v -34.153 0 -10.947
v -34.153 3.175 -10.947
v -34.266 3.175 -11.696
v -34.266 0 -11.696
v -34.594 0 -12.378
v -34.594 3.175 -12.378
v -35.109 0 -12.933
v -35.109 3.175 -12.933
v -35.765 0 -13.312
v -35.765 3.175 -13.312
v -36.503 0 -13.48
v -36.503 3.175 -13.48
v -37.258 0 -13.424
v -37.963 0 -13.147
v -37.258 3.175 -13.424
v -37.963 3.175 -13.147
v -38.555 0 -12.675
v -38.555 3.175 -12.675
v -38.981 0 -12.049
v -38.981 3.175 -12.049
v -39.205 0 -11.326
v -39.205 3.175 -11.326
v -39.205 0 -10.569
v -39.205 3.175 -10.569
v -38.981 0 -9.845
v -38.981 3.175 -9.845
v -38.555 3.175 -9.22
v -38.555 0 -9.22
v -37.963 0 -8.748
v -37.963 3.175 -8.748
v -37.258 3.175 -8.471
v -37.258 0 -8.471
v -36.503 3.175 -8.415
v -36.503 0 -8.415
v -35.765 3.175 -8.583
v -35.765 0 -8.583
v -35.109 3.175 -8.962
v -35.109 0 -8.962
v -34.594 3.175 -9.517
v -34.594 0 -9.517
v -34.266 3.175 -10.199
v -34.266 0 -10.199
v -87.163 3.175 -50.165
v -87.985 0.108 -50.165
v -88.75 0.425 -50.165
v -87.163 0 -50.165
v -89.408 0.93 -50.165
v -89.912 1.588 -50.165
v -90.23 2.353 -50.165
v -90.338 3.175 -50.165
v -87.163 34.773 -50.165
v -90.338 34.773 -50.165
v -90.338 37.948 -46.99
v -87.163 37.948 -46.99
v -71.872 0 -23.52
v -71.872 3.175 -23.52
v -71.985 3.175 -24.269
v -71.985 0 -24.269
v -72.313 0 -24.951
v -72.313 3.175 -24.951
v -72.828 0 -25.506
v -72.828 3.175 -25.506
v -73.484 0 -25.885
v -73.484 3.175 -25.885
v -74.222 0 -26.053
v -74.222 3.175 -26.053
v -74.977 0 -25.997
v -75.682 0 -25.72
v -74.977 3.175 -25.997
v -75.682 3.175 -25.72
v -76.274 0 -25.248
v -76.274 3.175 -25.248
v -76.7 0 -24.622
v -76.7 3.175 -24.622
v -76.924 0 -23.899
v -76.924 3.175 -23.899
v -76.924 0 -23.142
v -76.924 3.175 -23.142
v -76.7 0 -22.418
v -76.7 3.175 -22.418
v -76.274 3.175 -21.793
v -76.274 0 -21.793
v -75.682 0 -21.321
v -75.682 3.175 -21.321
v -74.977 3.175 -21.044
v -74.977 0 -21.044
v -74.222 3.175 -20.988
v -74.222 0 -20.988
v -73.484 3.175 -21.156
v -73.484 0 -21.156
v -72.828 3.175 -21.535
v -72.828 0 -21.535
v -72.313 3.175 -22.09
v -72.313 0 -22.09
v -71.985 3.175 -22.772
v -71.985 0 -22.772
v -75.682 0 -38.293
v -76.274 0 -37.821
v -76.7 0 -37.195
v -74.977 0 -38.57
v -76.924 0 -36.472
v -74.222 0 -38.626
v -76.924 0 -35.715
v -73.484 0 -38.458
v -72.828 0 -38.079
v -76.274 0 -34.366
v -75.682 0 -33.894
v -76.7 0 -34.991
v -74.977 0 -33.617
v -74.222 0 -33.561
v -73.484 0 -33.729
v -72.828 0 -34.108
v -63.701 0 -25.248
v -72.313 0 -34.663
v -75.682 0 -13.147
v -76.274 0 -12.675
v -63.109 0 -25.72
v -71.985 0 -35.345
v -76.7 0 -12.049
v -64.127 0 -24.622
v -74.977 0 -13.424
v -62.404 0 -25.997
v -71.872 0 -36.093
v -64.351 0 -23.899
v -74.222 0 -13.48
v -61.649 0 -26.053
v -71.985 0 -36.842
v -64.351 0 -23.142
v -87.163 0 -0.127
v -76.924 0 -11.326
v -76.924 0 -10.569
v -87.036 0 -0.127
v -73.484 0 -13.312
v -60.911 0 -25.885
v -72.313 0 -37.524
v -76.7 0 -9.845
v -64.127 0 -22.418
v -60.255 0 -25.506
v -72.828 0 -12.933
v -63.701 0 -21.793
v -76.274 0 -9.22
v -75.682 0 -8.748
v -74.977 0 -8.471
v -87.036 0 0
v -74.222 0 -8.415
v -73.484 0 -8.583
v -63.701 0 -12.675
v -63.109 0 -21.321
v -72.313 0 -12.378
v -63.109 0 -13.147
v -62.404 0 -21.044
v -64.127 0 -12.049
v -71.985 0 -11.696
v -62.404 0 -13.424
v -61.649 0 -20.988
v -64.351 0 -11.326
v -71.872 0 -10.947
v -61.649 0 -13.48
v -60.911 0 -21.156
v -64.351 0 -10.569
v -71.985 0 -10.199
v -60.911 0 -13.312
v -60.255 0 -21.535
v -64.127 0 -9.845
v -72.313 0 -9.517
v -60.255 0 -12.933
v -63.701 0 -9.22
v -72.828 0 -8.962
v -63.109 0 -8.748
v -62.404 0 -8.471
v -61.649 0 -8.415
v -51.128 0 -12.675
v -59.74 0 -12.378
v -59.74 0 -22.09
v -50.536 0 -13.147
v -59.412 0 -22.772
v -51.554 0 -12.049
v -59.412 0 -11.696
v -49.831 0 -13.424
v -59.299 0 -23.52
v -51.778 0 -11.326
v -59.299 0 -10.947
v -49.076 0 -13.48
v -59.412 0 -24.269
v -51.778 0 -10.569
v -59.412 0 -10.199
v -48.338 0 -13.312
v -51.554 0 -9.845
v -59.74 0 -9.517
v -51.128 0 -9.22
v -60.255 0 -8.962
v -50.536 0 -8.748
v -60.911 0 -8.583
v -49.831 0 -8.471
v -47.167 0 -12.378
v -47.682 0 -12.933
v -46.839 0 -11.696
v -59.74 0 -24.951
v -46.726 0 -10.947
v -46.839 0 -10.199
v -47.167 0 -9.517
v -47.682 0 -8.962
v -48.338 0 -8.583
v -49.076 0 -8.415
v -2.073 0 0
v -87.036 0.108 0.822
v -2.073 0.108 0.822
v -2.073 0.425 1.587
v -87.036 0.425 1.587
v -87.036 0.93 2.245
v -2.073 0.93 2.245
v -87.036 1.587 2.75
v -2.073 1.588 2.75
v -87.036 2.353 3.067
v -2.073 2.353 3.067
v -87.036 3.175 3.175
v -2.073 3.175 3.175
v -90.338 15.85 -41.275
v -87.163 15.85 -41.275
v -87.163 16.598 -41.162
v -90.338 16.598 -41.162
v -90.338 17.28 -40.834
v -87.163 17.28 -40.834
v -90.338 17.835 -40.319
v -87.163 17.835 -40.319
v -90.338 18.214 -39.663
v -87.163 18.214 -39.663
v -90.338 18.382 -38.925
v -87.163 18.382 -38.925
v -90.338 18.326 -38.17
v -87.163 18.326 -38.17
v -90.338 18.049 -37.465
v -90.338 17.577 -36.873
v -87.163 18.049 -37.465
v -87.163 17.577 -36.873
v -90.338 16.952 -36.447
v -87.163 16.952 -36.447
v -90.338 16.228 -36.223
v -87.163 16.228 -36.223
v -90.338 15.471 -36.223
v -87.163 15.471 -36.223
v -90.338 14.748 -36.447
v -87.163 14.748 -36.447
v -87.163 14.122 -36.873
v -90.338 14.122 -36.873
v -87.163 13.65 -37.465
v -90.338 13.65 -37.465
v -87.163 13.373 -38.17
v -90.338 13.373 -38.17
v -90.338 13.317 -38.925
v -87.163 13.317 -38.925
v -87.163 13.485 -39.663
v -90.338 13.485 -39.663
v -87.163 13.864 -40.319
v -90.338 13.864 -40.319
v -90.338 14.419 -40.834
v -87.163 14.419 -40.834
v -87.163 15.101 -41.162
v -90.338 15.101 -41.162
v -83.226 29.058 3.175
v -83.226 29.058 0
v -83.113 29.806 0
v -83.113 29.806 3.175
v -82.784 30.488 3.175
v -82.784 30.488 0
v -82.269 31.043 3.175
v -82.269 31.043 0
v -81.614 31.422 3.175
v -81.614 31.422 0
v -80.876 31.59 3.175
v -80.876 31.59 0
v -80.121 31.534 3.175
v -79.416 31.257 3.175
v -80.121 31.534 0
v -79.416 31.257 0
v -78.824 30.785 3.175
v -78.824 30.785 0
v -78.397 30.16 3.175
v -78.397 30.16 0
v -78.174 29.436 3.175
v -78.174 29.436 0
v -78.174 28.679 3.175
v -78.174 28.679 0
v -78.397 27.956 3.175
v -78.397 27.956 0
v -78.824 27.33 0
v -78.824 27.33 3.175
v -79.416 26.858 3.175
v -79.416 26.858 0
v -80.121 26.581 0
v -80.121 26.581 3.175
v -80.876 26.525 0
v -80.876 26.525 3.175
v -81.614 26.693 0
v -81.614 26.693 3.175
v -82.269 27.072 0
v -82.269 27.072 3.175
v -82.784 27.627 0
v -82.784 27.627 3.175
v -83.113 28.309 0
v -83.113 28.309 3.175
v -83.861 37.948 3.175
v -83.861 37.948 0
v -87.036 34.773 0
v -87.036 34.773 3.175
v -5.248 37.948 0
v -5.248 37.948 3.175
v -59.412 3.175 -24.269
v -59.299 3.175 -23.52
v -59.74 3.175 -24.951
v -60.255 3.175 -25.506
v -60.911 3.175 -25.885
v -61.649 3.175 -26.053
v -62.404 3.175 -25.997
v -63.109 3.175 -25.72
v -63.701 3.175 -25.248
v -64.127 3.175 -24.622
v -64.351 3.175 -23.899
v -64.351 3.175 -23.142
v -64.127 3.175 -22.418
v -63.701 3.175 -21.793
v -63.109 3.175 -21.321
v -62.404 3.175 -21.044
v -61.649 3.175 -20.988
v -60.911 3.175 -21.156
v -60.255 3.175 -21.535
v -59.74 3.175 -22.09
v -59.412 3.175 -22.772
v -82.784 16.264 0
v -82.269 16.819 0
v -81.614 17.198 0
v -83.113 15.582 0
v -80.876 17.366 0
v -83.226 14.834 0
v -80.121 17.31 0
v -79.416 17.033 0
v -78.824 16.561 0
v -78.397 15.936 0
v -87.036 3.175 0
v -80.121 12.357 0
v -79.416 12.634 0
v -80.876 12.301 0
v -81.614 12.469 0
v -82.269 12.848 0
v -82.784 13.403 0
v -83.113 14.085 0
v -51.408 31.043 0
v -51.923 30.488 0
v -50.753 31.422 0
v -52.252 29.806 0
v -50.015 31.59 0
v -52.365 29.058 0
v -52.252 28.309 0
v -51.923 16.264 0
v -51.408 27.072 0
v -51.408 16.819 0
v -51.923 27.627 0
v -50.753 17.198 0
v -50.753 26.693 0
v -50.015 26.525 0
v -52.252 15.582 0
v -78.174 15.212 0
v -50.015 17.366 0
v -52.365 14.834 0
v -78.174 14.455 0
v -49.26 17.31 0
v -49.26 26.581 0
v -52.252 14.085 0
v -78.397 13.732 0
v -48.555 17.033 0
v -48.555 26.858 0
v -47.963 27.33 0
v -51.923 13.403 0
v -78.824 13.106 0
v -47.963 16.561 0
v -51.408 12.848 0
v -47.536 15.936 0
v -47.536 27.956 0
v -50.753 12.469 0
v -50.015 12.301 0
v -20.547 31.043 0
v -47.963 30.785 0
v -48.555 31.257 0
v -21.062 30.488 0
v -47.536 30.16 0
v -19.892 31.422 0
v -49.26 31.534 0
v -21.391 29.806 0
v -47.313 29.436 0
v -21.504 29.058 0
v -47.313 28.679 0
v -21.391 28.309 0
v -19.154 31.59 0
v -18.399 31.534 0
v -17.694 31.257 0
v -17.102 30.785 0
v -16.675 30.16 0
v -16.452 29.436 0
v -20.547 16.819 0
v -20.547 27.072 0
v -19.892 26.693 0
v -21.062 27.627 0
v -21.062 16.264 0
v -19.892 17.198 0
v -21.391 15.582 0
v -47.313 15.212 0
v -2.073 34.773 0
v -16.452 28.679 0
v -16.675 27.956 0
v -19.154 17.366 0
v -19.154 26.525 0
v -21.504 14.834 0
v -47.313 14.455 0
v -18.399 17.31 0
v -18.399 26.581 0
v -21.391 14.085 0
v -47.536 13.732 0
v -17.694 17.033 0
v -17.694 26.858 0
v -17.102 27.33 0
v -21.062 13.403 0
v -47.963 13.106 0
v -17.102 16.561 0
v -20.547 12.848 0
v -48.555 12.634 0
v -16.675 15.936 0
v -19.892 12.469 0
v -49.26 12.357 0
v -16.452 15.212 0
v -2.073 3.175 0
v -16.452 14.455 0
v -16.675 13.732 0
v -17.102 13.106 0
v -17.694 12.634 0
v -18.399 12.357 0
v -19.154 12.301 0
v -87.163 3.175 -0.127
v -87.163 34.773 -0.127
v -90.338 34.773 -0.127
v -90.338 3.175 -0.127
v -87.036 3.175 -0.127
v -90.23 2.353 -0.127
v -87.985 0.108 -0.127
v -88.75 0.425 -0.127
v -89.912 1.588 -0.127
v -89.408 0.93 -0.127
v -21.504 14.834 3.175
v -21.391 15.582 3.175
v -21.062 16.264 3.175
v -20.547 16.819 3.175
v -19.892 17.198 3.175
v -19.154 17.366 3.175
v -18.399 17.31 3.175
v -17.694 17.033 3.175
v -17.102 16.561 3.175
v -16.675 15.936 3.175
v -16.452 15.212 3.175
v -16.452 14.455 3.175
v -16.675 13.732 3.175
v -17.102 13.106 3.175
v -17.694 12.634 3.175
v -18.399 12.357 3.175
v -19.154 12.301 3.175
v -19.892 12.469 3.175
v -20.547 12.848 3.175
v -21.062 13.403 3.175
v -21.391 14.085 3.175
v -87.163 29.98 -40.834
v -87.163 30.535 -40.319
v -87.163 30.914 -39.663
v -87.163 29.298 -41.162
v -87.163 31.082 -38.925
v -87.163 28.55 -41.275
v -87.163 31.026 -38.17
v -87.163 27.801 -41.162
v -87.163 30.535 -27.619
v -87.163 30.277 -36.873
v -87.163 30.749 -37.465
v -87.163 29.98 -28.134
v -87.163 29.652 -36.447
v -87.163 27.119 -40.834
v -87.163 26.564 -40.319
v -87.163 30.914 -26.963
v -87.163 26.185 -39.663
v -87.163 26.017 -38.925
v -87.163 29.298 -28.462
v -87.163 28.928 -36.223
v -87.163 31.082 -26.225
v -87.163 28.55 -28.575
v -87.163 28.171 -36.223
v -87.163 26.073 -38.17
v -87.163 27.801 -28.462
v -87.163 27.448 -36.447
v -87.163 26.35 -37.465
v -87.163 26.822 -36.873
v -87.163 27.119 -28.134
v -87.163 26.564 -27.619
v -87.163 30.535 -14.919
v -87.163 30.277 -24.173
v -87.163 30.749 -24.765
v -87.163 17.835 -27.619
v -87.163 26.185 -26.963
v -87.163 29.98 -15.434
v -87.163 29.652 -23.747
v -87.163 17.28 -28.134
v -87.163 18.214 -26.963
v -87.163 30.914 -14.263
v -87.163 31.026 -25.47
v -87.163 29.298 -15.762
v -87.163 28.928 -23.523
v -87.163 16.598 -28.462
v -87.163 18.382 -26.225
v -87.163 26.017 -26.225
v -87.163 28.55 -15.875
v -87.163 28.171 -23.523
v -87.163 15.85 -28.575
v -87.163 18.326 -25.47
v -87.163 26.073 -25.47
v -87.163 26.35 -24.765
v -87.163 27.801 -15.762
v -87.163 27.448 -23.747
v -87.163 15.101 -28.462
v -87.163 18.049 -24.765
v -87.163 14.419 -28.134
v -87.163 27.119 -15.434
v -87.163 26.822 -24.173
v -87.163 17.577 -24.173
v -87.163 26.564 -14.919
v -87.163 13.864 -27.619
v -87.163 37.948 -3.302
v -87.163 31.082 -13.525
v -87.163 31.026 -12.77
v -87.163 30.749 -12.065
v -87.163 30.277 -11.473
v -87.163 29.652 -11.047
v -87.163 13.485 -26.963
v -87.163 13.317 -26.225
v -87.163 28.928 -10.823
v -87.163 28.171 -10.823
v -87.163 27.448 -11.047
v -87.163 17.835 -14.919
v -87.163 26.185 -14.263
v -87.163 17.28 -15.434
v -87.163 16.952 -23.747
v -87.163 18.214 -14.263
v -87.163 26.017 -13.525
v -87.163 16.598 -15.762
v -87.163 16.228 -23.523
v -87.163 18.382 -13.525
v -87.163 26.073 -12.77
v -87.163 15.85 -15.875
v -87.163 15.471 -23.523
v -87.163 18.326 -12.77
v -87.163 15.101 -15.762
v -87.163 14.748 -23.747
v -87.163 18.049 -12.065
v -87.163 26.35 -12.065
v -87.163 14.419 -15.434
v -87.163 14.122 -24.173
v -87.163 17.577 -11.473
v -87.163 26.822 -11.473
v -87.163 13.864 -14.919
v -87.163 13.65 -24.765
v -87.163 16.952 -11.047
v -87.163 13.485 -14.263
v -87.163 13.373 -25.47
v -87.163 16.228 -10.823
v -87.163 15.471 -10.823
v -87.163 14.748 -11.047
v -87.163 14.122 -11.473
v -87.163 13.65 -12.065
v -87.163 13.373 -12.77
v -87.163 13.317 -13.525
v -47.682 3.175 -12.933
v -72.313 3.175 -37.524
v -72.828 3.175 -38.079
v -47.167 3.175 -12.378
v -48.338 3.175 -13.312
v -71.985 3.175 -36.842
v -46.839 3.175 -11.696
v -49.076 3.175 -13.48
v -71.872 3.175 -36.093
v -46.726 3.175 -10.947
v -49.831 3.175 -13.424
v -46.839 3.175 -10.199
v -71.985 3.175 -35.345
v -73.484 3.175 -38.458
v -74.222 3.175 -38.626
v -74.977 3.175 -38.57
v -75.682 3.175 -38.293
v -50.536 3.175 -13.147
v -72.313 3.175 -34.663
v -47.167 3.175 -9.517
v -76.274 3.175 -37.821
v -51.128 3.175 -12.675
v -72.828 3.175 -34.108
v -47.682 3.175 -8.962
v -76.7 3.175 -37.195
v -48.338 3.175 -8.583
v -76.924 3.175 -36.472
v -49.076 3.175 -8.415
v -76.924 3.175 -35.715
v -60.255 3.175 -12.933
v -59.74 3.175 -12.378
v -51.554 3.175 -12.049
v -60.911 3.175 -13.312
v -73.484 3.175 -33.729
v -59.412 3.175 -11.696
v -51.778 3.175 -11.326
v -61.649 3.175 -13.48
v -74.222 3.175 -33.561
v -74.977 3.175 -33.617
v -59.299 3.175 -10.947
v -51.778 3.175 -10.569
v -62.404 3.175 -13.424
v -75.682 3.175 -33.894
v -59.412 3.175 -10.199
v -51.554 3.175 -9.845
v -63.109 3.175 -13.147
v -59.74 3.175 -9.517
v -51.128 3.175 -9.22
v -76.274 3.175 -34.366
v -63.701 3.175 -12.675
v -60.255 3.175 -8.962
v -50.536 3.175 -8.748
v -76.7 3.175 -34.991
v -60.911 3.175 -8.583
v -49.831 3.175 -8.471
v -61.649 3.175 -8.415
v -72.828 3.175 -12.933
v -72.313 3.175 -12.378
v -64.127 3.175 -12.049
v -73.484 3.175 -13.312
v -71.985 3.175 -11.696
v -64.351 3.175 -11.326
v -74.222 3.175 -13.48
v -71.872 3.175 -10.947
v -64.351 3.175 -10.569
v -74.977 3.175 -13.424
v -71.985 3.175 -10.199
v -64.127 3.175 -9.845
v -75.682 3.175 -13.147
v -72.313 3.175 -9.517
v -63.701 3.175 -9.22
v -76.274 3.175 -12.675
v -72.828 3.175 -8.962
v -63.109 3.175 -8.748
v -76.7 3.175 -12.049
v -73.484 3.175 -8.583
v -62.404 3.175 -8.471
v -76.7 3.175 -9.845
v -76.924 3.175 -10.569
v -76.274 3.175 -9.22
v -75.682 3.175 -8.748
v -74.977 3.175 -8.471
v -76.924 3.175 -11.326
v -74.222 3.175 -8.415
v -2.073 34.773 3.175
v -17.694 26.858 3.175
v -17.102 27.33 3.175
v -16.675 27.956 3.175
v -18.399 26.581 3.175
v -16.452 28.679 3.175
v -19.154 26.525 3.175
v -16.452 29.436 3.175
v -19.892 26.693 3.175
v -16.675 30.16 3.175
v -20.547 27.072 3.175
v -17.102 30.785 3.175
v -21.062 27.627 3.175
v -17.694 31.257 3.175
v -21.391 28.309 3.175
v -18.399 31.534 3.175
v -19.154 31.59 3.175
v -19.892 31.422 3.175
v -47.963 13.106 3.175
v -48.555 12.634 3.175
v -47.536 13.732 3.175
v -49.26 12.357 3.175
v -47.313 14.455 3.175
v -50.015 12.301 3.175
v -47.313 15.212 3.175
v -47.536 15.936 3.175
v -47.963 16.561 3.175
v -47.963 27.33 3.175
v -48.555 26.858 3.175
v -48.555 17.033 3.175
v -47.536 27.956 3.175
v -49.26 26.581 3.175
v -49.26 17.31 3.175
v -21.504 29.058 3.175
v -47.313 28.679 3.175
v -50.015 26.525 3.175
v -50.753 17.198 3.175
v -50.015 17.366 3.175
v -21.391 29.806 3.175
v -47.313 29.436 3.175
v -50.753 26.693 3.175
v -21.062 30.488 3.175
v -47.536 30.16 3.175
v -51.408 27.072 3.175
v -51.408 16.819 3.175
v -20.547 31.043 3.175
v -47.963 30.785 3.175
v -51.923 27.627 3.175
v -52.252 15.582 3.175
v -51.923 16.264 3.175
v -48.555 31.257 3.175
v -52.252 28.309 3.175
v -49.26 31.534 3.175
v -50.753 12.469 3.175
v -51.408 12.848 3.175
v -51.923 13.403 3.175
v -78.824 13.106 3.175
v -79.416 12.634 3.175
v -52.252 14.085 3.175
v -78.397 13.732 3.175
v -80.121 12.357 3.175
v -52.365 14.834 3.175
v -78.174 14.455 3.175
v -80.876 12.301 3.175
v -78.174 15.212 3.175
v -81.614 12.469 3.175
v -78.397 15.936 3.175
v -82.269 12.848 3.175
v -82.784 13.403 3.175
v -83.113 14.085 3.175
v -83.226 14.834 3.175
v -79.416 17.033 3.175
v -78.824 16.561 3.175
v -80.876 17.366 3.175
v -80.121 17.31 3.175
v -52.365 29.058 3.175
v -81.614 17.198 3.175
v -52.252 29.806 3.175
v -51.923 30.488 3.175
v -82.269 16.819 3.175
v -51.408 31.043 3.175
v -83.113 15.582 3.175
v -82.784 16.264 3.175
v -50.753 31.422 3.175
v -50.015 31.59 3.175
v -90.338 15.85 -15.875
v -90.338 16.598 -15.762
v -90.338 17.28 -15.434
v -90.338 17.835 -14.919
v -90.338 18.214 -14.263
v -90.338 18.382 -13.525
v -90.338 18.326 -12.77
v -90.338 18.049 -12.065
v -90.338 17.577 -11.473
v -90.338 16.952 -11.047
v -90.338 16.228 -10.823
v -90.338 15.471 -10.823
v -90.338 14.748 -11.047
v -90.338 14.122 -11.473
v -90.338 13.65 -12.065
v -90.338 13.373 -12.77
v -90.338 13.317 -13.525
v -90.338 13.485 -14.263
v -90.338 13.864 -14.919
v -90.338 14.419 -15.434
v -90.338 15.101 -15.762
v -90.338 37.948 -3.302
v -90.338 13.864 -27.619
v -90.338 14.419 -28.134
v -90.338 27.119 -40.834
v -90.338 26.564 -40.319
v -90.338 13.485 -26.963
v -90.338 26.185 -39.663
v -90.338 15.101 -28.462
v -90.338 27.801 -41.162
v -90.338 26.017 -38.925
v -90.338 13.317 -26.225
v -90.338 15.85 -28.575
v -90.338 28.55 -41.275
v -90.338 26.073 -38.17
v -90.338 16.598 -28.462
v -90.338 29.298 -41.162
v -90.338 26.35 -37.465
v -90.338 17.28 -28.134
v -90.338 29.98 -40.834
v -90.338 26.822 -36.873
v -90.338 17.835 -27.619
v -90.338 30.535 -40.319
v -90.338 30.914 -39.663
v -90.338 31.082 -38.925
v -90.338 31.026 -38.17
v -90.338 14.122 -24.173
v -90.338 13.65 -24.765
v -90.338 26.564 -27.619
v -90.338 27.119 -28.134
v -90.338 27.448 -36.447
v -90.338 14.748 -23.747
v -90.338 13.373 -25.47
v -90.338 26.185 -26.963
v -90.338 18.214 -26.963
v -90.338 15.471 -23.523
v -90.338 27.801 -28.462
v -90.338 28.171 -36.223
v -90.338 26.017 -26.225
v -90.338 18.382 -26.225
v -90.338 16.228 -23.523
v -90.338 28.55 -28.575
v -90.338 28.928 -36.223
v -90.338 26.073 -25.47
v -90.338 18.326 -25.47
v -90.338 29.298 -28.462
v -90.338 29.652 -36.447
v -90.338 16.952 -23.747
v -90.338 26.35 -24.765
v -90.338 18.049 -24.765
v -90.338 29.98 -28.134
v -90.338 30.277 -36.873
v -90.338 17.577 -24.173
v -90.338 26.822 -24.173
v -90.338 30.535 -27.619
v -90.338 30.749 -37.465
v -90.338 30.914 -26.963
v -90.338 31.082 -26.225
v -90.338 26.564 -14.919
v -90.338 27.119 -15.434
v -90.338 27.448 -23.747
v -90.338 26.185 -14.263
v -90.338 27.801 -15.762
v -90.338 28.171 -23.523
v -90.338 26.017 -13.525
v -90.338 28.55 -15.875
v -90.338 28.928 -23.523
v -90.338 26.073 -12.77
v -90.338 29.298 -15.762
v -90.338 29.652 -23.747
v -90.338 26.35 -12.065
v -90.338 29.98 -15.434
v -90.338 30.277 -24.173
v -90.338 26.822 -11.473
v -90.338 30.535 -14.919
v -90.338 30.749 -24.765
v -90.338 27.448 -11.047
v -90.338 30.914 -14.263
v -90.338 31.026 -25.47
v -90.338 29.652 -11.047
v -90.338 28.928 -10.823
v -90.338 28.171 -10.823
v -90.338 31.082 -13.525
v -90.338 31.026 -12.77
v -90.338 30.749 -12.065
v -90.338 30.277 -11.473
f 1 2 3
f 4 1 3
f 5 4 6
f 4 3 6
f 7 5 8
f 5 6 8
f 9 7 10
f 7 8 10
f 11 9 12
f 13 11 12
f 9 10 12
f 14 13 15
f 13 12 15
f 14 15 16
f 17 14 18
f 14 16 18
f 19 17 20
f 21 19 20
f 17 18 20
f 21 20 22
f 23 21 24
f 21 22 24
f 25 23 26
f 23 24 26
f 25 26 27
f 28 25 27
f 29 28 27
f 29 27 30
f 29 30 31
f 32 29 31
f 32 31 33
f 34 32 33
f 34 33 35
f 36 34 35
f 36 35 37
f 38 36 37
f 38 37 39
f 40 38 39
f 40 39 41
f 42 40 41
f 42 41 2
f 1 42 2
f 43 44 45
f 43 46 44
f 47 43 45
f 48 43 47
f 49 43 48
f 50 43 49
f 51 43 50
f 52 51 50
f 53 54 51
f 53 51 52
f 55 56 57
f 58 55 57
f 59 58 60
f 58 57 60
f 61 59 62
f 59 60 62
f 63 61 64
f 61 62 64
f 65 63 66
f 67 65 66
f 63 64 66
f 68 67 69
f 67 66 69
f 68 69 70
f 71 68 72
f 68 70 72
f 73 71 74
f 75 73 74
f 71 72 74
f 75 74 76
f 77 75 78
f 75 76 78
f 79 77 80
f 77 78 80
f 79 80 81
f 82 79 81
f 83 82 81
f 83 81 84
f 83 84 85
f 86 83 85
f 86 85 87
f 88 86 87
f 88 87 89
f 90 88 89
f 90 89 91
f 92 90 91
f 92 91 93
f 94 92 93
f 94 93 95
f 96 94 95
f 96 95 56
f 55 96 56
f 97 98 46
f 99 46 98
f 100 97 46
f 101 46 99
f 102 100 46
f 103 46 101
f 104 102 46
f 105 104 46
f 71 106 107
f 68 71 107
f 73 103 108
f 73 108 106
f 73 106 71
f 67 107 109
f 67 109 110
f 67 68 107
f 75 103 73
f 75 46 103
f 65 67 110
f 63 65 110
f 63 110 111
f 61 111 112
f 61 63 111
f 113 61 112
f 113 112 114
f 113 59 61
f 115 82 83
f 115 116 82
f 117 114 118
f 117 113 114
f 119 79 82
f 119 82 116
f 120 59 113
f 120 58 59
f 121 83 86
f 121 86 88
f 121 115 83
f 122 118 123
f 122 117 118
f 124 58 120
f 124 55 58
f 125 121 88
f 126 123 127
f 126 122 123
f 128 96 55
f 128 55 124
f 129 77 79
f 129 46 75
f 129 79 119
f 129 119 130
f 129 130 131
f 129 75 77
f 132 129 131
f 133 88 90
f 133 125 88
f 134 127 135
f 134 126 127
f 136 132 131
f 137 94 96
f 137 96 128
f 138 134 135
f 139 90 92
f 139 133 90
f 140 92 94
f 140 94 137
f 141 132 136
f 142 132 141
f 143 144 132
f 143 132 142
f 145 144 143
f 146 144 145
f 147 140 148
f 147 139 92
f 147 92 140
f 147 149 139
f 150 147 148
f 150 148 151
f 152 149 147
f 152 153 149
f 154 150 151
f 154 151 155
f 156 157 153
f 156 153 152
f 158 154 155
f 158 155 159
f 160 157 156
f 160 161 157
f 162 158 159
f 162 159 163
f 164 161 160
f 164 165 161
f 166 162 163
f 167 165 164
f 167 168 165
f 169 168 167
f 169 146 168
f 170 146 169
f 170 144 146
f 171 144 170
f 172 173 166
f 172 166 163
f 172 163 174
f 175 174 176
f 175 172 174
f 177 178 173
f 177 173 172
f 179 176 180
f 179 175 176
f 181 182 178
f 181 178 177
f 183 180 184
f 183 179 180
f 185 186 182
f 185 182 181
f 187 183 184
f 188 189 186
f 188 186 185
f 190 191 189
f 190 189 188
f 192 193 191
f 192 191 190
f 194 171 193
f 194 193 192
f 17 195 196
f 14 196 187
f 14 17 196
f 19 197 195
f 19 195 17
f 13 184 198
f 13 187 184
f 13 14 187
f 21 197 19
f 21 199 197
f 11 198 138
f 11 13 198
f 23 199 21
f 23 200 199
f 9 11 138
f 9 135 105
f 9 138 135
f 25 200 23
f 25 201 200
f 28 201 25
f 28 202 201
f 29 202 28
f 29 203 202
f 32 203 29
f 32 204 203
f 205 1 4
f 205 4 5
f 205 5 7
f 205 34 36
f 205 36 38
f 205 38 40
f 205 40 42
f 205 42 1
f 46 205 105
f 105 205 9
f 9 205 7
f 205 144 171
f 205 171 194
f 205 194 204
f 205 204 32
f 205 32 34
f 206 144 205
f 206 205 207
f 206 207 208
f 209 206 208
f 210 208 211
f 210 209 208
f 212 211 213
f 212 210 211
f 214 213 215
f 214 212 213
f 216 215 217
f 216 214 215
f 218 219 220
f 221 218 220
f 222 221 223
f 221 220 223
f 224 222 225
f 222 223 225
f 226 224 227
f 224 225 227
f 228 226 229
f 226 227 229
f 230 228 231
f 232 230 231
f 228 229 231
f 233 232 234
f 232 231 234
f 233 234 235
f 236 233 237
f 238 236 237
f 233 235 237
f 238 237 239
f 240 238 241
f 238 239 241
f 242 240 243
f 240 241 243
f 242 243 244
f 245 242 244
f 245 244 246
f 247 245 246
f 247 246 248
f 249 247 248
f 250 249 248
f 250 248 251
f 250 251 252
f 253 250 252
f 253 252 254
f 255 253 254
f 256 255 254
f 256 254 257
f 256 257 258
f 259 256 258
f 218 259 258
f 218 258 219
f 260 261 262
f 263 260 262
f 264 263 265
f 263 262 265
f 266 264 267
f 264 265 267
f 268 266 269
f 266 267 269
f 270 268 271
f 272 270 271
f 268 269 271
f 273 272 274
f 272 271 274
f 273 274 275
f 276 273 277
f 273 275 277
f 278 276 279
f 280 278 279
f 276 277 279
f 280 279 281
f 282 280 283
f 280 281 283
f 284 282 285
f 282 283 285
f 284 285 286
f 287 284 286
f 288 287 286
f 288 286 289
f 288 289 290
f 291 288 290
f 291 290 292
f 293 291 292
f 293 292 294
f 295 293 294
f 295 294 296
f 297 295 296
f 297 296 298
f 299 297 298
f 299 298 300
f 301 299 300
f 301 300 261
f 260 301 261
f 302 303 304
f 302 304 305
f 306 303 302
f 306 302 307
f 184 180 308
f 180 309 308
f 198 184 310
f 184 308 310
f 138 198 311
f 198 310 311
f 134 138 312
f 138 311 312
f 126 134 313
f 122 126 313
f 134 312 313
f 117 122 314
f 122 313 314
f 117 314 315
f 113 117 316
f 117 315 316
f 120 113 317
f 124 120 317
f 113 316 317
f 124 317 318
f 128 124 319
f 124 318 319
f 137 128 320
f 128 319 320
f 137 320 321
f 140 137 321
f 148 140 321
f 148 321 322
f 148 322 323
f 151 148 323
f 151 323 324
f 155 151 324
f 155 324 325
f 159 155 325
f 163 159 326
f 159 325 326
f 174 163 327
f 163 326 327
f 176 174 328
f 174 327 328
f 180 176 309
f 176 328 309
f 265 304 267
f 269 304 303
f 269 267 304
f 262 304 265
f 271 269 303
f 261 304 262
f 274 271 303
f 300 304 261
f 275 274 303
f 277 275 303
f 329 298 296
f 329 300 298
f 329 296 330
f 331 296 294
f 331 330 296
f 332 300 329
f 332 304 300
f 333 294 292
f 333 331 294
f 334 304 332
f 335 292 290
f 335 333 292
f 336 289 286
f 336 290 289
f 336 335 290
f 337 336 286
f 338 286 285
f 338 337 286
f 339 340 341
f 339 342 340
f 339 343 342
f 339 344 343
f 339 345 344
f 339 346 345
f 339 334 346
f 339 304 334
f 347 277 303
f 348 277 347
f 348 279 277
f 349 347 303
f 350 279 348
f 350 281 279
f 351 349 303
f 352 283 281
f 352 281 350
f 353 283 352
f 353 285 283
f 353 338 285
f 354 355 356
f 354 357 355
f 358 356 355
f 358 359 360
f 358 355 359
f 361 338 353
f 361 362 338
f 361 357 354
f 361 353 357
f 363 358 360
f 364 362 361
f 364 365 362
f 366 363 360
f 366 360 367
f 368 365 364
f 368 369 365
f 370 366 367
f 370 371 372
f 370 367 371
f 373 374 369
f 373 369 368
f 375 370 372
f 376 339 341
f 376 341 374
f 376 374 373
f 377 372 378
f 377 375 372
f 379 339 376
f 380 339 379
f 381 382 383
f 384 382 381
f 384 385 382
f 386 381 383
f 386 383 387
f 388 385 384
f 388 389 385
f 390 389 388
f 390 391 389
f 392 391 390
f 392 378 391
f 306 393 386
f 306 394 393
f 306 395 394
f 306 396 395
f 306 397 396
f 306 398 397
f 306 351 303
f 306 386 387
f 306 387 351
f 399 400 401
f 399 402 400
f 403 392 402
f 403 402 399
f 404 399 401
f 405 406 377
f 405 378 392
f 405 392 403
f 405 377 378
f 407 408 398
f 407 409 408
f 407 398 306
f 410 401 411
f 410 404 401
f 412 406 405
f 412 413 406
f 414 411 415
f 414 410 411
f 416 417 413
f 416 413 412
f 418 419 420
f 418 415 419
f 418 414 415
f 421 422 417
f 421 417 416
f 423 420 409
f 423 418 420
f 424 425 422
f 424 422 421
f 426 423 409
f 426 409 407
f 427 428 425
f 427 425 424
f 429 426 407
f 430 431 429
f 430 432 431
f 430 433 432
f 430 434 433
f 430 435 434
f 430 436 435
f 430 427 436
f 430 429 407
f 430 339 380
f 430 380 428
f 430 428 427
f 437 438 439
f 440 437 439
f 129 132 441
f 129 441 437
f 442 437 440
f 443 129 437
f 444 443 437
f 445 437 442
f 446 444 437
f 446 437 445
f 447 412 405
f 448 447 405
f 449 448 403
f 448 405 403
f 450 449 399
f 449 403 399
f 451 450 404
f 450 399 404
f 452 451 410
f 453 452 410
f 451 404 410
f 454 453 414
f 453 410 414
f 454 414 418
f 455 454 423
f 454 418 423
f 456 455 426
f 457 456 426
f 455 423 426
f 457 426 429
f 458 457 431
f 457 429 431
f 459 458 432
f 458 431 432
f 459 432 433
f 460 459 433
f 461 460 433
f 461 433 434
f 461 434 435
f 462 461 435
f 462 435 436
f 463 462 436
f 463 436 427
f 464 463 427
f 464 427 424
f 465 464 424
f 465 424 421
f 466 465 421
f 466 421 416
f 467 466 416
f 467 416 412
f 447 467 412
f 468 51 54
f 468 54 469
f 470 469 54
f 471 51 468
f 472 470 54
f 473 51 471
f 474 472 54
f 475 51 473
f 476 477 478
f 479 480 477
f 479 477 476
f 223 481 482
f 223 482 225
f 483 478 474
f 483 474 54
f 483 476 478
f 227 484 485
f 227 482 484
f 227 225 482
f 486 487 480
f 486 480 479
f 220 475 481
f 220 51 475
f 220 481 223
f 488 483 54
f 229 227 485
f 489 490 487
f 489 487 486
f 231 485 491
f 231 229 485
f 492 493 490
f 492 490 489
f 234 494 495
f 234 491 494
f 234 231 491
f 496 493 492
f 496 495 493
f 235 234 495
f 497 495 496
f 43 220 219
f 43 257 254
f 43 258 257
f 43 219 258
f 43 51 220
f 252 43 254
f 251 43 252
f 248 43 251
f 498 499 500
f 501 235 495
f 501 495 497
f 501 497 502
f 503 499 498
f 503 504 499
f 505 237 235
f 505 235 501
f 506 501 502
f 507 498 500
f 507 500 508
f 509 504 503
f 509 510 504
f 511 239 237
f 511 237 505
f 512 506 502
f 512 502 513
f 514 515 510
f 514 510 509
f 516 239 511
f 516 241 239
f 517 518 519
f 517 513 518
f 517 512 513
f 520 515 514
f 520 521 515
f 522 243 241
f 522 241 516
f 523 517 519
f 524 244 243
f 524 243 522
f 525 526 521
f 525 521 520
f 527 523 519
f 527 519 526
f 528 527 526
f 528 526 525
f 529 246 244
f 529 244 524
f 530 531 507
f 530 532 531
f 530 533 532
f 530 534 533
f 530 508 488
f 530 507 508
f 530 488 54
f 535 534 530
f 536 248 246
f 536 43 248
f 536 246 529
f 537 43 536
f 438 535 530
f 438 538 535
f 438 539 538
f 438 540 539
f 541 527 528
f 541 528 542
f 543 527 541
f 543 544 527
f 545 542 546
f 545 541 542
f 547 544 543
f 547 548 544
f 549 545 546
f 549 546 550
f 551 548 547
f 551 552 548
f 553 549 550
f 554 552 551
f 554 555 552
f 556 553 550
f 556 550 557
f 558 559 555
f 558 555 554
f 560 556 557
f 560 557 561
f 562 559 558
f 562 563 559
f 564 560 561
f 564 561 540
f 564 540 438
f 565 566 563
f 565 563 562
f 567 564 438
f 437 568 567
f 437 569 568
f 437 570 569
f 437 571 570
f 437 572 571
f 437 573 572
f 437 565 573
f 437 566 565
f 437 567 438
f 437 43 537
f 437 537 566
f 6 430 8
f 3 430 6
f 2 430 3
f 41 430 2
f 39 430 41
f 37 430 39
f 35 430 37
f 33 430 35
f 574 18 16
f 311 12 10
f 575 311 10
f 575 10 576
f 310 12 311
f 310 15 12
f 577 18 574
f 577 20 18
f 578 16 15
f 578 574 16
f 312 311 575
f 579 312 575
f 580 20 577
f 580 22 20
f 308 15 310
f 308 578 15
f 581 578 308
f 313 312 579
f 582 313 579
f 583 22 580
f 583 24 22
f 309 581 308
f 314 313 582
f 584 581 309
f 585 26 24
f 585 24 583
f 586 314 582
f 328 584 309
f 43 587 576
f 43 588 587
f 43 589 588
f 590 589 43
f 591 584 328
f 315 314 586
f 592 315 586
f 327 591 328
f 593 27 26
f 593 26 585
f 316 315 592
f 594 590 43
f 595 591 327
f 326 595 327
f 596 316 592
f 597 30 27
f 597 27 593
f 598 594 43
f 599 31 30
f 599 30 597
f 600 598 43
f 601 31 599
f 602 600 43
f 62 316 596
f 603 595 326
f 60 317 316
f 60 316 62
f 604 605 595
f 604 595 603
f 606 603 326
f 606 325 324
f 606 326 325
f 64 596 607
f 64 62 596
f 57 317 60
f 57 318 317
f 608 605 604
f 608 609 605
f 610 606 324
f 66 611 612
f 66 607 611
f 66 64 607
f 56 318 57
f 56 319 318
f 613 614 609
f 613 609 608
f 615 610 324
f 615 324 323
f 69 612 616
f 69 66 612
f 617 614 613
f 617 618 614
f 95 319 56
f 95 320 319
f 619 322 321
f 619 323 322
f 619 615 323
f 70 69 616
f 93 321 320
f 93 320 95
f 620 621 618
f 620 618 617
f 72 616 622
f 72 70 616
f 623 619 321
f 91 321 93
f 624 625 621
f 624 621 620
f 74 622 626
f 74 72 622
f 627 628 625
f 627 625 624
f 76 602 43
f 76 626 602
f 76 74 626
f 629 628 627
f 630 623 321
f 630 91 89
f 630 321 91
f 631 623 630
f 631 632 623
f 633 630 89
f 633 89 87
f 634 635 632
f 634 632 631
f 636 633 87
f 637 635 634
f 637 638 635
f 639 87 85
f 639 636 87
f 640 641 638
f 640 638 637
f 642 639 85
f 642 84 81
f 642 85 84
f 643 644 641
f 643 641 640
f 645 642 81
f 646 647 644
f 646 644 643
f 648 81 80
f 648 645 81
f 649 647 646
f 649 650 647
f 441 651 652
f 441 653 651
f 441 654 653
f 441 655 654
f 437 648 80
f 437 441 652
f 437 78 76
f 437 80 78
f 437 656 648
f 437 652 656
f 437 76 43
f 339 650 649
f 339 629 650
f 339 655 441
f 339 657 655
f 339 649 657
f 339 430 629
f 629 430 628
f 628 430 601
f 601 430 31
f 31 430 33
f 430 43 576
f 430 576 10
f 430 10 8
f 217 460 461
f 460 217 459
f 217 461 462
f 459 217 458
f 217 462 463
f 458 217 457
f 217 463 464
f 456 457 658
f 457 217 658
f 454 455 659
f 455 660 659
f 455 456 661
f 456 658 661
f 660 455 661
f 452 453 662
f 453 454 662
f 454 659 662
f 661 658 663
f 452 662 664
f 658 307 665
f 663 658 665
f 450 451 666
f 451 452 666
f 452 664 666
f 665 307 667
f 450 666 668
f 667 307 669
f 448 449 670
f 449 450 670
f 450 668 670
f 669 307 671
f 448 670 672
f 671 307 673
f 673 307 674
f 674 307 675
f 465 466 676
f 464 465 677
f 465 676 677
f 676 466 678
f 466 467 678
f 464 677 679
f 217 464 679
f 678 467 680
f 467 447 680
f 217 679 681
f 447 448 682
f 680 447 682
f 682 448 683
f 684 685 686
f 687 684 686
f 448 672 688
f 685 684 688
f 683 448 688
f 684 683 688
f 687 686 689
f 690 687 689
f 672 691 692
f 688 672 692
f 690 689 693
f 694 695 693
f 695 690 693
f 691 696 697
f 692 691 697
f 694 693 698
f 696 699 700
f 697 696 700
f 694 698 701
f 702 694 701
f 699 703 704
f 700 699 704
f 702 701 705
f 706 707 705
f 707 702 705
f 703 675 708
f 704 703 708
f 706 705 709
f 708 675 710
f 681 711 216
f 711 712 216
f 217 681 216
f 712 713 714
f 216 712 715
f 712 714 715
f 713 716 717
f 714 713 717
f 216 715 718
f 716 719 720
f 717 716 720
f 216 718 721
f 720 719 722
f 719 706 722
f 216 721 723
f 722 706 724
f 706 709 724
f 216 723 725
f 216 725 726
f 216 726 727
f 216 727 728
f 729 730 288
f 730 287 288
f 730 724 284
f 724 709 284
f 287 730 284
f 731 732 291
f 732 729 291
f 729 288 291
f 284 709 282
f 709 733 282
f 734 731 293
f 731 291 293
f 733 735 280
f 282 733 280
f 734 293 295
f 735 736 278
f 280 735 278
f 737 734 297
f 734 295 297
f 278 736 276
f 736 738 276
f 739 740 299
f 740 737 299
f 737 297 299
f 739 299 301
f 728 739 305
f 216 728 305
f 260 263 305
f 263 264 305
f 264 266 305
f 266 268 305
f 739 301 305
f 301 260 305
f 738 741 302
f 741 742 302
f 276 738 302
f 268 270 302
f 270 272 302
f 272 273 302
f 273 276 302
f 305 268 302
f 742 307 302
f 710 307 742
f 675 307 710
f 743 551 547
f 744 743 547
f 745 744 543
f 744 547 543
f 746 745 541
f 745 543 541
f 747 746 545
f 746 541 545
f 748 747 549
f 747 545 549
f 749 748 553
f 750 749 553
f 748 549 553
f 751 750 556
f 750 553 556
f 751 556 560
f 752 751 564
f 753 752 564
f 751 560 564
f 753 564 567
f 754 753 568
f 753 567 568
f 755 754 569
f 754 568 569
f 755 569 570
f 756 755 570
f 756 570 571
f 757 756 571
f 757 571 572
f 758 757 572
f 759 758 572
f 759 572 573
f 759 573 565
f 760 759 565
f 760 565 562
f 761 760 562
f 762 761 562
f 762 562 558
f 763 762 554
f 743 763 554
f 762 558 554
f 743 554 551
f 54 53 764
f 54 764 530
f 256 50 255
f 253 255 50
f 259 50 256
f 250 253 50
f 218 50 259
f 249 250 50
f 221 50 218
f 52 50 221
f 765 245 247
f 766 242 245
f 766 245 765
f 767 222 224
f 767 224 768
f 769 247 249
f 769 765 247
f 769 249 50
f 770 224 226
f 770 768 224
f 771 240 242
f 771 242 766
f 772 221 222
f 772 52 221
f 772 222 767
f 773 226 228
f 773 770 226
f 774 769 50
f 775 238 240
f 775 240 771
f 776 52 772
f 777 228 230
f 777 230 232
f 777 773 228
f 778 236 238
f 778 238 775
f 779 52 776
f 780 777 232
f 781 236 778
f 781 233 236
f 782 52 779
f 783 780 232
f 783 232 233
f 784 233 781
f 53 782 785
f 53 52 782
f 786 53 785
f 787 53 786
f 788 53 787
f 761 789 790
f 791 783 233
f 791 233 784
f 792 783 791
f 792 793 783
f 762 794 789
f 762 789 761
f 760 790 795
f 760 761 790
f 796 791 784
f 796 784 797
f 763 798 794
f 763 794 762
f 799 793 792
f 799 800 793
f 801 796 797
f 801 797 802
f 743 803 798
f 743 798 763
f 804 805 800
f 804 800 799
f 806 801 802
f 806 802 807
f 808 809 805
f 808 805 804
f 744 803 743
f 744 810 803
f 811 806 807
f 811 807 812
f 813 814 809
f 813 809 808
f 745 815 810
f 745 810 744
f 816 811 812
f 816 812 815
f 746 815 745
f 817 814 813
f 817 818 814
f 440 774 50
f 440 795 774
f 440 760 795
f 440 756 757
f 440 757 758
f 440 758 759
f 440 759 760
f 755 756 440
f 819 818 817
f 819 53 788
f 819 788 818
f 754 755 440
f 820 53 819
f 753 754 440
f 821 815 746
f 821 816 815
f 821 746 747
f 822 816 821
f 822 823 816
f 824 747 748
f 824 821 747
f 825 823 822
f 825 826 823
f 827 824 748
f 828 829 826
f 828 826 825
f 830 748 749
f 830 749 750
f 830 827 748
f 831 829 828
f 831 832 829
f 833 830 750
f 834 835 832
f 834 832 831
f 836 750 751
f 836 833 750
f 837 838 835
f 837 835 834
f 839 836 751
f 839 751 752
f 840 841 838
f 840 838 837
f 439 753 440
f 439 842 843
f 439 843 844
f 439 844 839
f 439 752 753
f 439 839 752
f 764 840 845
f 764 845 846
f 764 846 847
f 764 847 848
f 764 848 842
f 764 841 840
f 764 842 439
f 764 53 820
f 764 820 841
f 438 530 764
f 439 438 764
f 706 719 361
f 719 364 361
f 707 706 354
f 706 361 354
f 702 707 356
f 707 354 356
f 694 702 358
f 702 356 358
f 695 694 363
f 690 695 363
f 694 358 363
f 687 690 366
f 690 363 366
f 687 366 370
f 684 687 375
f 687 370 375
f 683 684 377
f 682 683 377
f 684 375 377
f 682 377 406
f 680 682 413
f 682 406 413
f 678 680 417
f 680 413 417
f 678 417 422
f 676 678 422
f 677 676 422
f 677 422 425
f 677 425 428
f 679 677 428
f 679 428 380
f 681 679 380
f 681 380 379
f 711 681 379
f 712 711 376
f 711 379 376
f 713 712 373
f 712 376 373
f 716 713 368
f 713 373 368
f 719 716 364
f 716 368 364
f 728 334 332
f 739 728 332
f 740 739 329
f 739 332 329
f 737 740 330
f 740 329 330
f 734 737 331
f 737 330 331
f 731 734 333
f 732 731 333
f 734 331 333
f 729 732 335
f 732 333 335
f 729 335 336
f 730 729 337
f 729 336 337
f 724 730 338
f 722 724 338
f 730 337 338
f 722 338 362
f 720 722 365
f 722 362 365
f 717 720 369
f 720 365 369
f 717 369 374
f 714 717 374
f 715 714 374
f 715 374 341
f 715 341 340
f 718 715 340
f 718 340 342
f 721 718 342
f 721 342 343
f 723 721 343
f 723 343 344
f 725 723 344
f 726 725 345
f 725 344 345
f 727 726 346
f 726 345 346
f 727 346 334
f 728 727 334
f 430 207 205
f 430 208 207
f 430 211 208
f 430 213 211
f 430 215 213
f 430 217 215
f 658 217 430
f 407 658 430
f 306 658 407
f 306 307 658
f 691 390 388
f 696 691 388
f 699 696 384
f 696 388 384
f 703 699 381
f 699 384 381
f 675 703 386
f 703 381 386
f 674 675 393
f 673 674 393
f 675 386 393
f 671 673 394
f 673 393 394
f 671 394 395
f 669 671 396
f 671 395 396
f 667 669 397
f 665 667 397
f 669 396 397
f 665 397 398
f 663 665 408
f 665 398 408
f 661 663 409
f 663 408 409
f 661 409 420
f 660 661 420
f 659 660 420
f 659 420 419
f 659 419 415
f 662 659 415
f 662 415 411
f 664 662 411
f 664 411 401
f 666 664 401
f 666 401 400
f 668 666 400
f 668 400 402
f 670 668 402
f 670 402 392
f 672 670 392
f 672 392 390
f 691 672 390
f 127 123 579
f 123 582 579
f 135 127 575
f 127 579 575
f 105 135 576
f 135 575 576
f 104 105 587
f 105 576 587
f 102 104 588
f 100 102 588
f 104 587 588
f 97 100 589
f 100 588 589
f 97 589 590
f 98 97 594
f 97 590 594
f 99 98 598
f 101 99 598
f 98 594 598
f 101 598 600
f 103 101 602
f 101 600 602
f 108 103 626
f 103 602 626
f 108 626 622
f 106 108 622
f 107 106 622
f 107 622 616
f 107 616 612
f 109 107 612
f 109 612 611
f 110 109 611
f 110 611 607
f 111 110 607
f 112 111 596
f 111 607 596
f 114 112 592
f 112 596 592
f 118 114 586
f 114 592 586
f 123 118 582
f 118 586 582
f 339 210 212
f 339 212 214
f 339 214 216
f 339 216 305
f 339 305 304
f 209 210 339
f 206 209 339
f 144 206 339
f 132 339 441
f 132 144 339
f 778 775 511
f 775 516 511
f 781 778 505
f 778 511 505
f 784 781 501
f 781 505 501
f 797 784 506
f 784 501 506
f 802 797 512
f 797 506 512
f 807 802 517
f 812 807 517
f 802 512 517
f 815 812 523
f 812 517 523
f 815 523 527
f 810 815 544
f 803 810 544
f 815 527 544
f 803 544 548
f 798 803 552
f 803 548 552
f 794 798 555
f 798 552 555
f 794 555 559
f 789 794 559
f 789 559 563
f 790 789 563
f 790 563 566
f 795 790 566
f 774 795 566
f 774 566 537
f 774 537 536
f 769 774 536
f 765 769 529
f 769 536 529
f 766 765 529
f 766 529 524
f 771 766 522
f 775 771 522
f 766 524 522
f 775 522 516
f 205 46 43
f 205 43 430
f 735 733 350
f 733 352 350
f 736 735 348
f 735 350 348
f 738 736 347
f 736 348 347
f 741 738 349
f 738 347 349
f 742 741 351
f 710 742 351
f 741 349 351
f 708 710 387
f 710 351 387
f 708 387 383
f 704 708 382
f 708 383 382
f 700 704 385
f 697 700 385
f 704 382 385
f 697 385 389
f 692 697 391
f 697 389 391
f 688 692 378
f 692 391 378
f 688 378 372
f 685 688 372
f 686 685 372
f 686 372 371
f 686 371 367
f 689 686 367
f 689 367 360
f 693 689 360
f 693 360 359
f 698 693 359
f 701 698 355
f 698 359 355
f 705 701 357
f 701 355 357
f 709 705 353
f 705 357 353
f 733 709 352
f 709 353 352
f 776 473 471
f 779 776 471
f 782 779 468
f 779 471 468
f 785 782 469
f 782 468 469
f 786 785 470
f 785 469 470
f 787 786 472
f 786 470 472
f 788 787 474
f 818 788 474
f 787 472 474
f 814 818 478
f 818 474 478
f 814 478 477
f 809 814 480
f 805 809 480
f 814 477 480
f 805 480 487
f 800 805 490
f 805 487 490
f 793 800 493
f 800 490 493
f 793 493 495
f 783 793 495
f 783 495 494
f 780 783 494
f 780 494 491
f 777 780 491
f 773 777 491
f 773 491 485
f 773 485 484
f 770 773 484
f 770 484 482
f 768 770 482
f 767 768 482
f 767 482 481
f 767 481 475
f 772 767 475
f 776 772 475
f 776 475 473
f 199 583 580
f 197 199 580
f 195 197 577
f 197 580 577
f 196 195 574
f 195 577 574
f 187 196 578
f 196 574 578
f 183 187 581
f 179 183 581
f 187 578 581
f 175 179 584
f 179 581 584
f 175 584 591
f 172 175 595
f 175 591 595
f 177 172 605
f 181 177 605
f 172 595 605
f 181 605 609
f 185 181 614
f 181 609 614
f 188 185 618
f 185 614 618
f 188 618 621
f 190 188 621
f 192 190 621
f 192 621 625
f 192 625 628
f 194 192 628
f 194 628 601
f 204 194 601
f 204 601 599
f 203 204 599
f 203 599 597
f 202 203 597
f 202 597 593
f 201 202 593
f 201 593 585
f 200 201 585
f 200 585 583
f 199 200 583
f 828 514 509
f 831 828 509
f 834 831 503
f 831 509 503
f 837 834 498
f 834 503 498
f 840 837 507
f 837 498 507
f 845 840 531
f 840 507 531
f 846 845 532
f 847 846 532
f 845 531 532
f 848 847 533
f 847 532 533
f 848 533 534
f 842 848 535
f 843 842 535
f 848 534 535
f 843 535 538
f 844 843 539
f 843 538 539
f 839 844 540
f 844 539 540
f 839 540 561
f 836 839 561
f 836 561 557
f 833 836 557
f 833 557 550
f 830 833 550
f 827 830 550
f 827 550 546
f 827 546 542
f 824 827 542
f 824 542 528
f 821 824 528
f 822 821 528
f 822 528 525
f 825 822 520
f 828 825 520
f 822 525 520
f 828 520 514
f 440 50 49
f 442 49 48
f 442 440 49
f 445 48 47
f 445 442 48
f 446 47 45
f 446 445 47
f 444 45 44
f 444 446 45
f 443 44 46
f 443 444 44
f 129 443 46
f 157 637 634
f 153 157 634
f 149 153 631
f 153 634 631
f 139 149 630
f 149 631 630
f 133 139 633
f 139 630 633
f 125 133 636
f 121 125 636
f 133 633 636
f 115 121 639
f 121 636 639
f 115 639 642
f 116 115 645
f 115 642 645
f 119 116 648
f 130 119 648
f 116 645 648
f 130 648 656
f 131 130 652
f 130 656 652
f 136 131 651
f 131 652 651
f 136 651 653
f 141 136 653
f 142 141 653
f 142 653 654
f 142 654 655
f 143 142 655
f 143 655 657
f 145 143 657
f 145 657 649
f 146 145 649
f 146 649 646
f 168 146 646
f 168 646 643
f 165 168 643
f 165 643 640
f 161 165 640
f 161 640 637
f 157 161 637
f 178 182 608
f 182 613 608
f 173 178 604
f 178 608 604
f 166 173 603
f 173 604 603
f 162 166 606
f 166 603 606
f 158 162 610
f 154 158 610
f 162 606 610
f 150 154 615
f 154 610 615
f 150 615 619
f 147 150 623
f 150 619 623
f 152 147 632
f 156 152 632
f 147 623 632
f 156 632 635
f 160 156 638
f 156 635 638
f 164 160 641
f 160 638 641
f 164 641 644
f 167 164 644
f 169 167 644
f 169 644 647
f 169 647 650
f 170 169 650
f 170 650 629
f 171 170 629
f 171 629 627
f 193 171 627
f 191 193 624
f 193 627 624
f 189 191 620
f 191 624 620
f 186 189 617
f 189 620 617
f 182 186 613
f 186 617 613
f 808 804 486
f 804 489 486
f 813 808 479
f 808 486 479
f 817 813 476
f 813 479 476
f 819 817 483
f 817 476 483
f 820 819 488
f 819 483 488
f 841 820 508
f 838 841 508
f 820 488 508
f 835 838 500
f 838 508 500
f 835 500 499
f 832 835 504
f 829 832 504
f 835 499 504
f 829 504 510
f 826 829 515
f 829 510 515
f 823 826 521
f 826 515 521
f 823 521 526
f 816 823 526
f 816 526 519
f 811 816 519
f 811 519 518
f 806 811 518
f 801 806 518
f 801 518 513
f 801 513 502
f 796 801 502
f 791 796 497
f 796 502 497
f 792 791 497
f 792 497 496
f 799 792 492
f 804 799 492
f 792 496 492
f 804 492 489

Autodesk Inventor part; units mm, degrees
ref_plane "YZ Plane" through (0, 0, 0) normal (1, 0, 0) x (0, 1, 0)
ref_plane "XZ Plane" through (0, 0, 0) normal (0, 1, 0) x (-1, 0, 0)
ref_plane "XY Plane" through (0, 0, 0) normal (0, 0, 1) x (1, 0, 0)
sketch "Sketch1" plane through (0, 0, 0) normal (0, 1, 0) x (-1, 0, 0)
  line L0 (2.0728, 0) -> (87.1628, 0)
  line L1 (87.1628, 0) -> (87.1628, -50.165)
  line L2 (87.1628, -50.165) -> (2.0728, -50.165)
  line L3 (2.0728, -50.165) -> (2.0728, 0)
  line L4 (87.1628, -50.165) -> (2.0728, 0)
  point P0 (0, 0)
  dimension "d0" = 85.09
  dimension "d1" = 50.165
extrude "Extrusion1" add sketch "Sketch1" along normal blind 3.175 contours L0 L1 L4
sketch "Sketch2" plane through (0, 3.175, 0) normal (0, 1, 0) x (1, 0, 0)
  line L0 (-87.1628, 0) -> (-2.0728, 0) projected
  line L1 (-87.1628, 0) -> (-90.3378, 0)
  line L2 (-90.3378, 0) -> (-90.3378, 50.165)
  line L3 (-90.3378, 50.165) -> (-87.1628, 50.165)
  line L4 (-87.1628, 50.165) -> (-87.1628, 0)
  line L5 (-87.1628, 0) -> (-2.0728, 0)
  line L6 (-2.0728, 0) -> (-2.0728, -3.175)
  line L7 (-2.0728, -3.175) -> (-87.1628, -3.175)
  line L8 (-87.1628, -3.175) -> (-87.1628, 0)
  line L9 (-90.3378, 0) -> (-87.1628, 0)
  line L10 (-87.1628, 0) -> (-87.1628, -3.175)
  line L11 (-87.1628, -3.175) -> (-90.3378, -3.175)
  line L12 (-90.3378, -3.175) -> (-90.3378, 0)
  point P0 (0, 0)
  dimension "d4" = 3.175
  dimension "d5" = 3.175
extrude "Extrusion2" add sketch "Sketch2" along normal blind 34.7726 contours L1 L2 L3 L4 | L0 L6 L7 L8
sketch "Sketch3" plane through (0, 37.9476, 0) normal (0, 1, 0) x (1, 0, 0)
  line L0 (-87.1628, 0) -> (-90.3378, 0)
  line L1 (-90.3378, 0) -> (-90.3378, -3.175)
  line L2 (-90.3378, -3.175) -> (-87.1628, -3.175)
  line L3 (-87.1628, -3.175) -> (-87.1628, 0)
  point P0 (0, 0)
  dimension "d8" = 3.175
extrude "Extrusion3" add sketch "Sketch3" against normal blind 34.7726
sketch "Sketch4" plane through (0, 3.175, 0) normal (0, -1, 0) x (1, 0, 0)
  line L0 (-87.1628, 0) -> (-2.0728, 0) projected
  line L1 (-2.0728, 3.175) -> (-2.0728, 0) projected
  line L2 (-2.0728, 3.175) -> (-90.3378, 3.175) projected
  line L3 (-90.3378, -50.165) -> (-90.3378, 3.175) projected
  line L4 (-87.1628, -50.165) -> (-90.3378, -50.165) projected
  line L5 (-87.1628, -50.165) -> (-87.1628, 0) projected
  point P0 (0, 0)
extrude "Extrusion4" add sketch "Sketch4" along normal blind 3.175
fillet "Fillet1" radius 3.175 2 edges at (-46.2053, 0, 3.175) (-90.3378, 0, -23.495)
sketch "Sketch5" plane through (0, 0, 0) normal (0, -1, 0) x (1, 0, 0)
  line L0 (-87.0358, -0.127) -> (-90.3378, -0.127)
  line L1 (-90.3378, -0.127) -> (-90.3378, 3.175)
  line L2 (-90.3378, 3.175) -> (-87.0358, 3.175)
  line L3 (-87.0358, 3.175) -> (-87.0358, -0.127)
  line L4 (-90.3378, 0) -> (-90.3378, -50.165) projected
  line L5 (-2.0728, 3.175) -> (-87.1628, 3.175) projected
  point P0 (0, 0)
  dimension "d22" = 3.302
  dimension "d23" = 3.302
  dimension "d24" = 0
  dimension "d25" = 0
extrude "Extrusion5" cut sketch "Sketch5" against normal blind 127
chamfer "Chamfer4" distance 3.175 angle 45 4 edges at (-2.0728, 37.9476, 1.5875) (-88.7503, 37.9476, -50.165) (-88.7503, 37.9476, -0.127) (-87.0358, 37.9476, 1.5875)
sketch "Sketch6" plane through (-87.1628, 3.175, -0.127) normal (1, 0, 0) x (0, 0, -1)
  line L0 (50.038, 0) -> (50.038, 31.5976) projected
  line L1 (3.175, 34.7726) -> (46.863, 34.7726) projected
  circle A0 centre (38.608, 25.3746) radius 2.54
  circle A1 centre (38.608, 12.6746) radius 2.54
  circle A2 centre (25.908, 25.3746) radius 2.54
  circle A3 centre (25.908, 12.6746) radius 2.54
  circle A4 centre (13.208, 25.3746) radius 2.54
  circle A5 centre (13.208, 12.6746) radius 2.54
  point P0 (-0.127, -3.175)
  dimension "d43" = 25.4
  dimension "d32" = 5.08
  dimension "d34" = 11.43
  dimension "d35" = 9.398
  dimension "d36" = 5.08
  dimension "d37" = 12.7
  dimension "d40" = 12.7
extrude "Extrusion6" cut sketch "Sketch6" against normal blind 127
sketch "Sketch7" plane through (-2.0728, 3.175, 0) normal (0, 0, -1) x (-1, 0, 0)
  line L0 (3.175, 34.7726) -> (81.788, 34.7726) projected
  line L1 (84.963, 0) -> (0, 0) projected
  line L2 (84.963, 0) -> (84.963, 31.5976) projected
  circle A0 centre (78.613, 25.8826) radius 2.54
  circle A1 centre (47.752, 25.8826) radius 2.54
  circle A2 centre (16.891, 25.8826) radius 2.54
  circle A3 centre (78.613, 11.6586) radius 2.54
  circle A4 centre (47.752, 11.6586) radius 2.54
  circle A5 centre (16.891, 11.6586) radius 2.54
  point P0 (-2.0728, -3.175)
  dimension "d48" = 5.08
  dimension "d49" = 6.35
  dimension "d50" = 8.89
  dimension "d53" = 30.861
  dimension "d56" = 14.224
extrude "Extrusion7" cut sketch "Sketch7" against normal blind 127
sketch "Sketch8" plane through (0, 3.175, 0) normal (0, 1, 0) x (1, 0, 0)
  line L0 (-87.0358, 0) -> (-2.0728, 0) projected
  line L1 (-87.1628, 50.165) -> (-87.1628, 0.127) projected
  circle A0 centre (-74.412, 36.0934) radius 2.54
  line L2 (-87.1628, 50.165) -> (-90.3378, 50.165) projected
  circle A1 centre (-61.839, 36.0934) radius 2.54
  circle A2 centre (-49.266, 36.0934) radius 2.54
  circle A3 centre (-36.693, 36.0934) radius 2.54
  circle A4 centre (-74.412, 23.5204) radius 2.54
  circle A5 centre (-61.839, 23.5204) radius 2.54
  circle A6 centre (-49.266, 23.5204) radius 2.54
  circle A7 centre (-36.693, 23.5204) radius 2.54
  circle A8 centre (-74.412, 10.9474) radius 2.54
  circle A9 centre (-61.839, 10.9474) radius 2.54
  circle A10 centre (-49.266, 10.9474) radius 2.54
  circle A11 centre (-36.693, 10.9474) radius 2.54
  point P0 (0, 0)
  dimension "d61" = 5.08
  dimension "d63" = 12.7508
  dimension "d64" = 14.0716
  dimension "d67" = 12.573
  dimension "d70" = 12.573
extrude "Extrusion8" cut sketch "Sketch8" against normal blind 127 contours A0 | A4 | A5 | A8 | A9 | A10 | A11
properties part number "Chassis_BumperAttachment Bruh"
